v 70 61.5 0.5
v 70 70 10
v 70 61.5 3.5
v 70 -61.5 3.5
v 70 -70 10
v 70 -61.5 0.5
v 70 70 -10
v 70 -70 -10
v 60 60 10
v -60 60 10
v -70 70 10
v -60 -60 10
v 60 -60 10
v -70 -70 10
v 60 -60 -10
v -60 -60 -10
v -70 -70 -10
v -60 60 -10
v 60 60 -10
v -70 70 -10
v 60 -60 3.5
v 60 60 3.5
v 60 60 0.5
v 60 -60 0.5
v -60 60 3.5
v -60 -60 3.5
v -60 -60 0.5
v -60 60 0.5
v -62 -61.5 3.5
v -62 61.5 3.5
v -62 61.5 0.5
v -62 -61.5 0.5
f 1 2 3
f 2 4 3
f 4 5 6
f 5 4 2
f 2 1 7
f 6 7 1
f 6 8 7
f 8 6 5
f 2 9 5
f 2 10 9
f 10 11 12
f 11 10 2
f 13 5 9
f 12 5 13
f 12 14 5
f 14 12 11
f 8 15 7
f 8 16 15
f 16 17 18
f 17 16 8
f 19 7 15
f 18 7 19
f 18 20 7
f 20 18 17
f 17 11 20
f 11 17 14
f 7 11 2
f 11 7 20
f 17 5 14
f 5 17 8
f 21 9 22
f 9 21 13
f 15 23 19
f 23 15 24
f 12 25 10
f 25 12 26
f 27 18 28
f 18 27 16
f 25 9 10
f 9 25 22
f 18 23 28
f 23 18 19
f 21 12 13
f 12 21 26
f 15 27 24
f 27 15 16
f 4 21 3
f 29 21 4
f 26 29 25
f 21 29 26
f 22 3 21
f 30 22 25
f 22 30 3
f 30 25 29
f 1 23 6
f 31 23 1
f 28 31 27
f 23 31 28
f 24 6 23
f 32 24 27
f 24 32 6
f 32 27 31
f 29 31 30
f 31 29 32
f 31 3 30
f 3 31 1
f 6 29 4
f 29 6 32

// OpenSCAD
BoxH=140;
BoxW=BoxH;
BoxD=20;
cutH=120;
cutW=cutH;
cutD=BoxD+5;

LidH=BoxH+20;
LidD=2;
LidW=cutW+2;

difference()
{
  cube([BoxH,BoxW,BoxD],true);
  cube([cutH,cutW,cutD],true);
  translate([cutD-2,0,2]) cube([LidH+10,LidW+1,LidD+1],true);
}
